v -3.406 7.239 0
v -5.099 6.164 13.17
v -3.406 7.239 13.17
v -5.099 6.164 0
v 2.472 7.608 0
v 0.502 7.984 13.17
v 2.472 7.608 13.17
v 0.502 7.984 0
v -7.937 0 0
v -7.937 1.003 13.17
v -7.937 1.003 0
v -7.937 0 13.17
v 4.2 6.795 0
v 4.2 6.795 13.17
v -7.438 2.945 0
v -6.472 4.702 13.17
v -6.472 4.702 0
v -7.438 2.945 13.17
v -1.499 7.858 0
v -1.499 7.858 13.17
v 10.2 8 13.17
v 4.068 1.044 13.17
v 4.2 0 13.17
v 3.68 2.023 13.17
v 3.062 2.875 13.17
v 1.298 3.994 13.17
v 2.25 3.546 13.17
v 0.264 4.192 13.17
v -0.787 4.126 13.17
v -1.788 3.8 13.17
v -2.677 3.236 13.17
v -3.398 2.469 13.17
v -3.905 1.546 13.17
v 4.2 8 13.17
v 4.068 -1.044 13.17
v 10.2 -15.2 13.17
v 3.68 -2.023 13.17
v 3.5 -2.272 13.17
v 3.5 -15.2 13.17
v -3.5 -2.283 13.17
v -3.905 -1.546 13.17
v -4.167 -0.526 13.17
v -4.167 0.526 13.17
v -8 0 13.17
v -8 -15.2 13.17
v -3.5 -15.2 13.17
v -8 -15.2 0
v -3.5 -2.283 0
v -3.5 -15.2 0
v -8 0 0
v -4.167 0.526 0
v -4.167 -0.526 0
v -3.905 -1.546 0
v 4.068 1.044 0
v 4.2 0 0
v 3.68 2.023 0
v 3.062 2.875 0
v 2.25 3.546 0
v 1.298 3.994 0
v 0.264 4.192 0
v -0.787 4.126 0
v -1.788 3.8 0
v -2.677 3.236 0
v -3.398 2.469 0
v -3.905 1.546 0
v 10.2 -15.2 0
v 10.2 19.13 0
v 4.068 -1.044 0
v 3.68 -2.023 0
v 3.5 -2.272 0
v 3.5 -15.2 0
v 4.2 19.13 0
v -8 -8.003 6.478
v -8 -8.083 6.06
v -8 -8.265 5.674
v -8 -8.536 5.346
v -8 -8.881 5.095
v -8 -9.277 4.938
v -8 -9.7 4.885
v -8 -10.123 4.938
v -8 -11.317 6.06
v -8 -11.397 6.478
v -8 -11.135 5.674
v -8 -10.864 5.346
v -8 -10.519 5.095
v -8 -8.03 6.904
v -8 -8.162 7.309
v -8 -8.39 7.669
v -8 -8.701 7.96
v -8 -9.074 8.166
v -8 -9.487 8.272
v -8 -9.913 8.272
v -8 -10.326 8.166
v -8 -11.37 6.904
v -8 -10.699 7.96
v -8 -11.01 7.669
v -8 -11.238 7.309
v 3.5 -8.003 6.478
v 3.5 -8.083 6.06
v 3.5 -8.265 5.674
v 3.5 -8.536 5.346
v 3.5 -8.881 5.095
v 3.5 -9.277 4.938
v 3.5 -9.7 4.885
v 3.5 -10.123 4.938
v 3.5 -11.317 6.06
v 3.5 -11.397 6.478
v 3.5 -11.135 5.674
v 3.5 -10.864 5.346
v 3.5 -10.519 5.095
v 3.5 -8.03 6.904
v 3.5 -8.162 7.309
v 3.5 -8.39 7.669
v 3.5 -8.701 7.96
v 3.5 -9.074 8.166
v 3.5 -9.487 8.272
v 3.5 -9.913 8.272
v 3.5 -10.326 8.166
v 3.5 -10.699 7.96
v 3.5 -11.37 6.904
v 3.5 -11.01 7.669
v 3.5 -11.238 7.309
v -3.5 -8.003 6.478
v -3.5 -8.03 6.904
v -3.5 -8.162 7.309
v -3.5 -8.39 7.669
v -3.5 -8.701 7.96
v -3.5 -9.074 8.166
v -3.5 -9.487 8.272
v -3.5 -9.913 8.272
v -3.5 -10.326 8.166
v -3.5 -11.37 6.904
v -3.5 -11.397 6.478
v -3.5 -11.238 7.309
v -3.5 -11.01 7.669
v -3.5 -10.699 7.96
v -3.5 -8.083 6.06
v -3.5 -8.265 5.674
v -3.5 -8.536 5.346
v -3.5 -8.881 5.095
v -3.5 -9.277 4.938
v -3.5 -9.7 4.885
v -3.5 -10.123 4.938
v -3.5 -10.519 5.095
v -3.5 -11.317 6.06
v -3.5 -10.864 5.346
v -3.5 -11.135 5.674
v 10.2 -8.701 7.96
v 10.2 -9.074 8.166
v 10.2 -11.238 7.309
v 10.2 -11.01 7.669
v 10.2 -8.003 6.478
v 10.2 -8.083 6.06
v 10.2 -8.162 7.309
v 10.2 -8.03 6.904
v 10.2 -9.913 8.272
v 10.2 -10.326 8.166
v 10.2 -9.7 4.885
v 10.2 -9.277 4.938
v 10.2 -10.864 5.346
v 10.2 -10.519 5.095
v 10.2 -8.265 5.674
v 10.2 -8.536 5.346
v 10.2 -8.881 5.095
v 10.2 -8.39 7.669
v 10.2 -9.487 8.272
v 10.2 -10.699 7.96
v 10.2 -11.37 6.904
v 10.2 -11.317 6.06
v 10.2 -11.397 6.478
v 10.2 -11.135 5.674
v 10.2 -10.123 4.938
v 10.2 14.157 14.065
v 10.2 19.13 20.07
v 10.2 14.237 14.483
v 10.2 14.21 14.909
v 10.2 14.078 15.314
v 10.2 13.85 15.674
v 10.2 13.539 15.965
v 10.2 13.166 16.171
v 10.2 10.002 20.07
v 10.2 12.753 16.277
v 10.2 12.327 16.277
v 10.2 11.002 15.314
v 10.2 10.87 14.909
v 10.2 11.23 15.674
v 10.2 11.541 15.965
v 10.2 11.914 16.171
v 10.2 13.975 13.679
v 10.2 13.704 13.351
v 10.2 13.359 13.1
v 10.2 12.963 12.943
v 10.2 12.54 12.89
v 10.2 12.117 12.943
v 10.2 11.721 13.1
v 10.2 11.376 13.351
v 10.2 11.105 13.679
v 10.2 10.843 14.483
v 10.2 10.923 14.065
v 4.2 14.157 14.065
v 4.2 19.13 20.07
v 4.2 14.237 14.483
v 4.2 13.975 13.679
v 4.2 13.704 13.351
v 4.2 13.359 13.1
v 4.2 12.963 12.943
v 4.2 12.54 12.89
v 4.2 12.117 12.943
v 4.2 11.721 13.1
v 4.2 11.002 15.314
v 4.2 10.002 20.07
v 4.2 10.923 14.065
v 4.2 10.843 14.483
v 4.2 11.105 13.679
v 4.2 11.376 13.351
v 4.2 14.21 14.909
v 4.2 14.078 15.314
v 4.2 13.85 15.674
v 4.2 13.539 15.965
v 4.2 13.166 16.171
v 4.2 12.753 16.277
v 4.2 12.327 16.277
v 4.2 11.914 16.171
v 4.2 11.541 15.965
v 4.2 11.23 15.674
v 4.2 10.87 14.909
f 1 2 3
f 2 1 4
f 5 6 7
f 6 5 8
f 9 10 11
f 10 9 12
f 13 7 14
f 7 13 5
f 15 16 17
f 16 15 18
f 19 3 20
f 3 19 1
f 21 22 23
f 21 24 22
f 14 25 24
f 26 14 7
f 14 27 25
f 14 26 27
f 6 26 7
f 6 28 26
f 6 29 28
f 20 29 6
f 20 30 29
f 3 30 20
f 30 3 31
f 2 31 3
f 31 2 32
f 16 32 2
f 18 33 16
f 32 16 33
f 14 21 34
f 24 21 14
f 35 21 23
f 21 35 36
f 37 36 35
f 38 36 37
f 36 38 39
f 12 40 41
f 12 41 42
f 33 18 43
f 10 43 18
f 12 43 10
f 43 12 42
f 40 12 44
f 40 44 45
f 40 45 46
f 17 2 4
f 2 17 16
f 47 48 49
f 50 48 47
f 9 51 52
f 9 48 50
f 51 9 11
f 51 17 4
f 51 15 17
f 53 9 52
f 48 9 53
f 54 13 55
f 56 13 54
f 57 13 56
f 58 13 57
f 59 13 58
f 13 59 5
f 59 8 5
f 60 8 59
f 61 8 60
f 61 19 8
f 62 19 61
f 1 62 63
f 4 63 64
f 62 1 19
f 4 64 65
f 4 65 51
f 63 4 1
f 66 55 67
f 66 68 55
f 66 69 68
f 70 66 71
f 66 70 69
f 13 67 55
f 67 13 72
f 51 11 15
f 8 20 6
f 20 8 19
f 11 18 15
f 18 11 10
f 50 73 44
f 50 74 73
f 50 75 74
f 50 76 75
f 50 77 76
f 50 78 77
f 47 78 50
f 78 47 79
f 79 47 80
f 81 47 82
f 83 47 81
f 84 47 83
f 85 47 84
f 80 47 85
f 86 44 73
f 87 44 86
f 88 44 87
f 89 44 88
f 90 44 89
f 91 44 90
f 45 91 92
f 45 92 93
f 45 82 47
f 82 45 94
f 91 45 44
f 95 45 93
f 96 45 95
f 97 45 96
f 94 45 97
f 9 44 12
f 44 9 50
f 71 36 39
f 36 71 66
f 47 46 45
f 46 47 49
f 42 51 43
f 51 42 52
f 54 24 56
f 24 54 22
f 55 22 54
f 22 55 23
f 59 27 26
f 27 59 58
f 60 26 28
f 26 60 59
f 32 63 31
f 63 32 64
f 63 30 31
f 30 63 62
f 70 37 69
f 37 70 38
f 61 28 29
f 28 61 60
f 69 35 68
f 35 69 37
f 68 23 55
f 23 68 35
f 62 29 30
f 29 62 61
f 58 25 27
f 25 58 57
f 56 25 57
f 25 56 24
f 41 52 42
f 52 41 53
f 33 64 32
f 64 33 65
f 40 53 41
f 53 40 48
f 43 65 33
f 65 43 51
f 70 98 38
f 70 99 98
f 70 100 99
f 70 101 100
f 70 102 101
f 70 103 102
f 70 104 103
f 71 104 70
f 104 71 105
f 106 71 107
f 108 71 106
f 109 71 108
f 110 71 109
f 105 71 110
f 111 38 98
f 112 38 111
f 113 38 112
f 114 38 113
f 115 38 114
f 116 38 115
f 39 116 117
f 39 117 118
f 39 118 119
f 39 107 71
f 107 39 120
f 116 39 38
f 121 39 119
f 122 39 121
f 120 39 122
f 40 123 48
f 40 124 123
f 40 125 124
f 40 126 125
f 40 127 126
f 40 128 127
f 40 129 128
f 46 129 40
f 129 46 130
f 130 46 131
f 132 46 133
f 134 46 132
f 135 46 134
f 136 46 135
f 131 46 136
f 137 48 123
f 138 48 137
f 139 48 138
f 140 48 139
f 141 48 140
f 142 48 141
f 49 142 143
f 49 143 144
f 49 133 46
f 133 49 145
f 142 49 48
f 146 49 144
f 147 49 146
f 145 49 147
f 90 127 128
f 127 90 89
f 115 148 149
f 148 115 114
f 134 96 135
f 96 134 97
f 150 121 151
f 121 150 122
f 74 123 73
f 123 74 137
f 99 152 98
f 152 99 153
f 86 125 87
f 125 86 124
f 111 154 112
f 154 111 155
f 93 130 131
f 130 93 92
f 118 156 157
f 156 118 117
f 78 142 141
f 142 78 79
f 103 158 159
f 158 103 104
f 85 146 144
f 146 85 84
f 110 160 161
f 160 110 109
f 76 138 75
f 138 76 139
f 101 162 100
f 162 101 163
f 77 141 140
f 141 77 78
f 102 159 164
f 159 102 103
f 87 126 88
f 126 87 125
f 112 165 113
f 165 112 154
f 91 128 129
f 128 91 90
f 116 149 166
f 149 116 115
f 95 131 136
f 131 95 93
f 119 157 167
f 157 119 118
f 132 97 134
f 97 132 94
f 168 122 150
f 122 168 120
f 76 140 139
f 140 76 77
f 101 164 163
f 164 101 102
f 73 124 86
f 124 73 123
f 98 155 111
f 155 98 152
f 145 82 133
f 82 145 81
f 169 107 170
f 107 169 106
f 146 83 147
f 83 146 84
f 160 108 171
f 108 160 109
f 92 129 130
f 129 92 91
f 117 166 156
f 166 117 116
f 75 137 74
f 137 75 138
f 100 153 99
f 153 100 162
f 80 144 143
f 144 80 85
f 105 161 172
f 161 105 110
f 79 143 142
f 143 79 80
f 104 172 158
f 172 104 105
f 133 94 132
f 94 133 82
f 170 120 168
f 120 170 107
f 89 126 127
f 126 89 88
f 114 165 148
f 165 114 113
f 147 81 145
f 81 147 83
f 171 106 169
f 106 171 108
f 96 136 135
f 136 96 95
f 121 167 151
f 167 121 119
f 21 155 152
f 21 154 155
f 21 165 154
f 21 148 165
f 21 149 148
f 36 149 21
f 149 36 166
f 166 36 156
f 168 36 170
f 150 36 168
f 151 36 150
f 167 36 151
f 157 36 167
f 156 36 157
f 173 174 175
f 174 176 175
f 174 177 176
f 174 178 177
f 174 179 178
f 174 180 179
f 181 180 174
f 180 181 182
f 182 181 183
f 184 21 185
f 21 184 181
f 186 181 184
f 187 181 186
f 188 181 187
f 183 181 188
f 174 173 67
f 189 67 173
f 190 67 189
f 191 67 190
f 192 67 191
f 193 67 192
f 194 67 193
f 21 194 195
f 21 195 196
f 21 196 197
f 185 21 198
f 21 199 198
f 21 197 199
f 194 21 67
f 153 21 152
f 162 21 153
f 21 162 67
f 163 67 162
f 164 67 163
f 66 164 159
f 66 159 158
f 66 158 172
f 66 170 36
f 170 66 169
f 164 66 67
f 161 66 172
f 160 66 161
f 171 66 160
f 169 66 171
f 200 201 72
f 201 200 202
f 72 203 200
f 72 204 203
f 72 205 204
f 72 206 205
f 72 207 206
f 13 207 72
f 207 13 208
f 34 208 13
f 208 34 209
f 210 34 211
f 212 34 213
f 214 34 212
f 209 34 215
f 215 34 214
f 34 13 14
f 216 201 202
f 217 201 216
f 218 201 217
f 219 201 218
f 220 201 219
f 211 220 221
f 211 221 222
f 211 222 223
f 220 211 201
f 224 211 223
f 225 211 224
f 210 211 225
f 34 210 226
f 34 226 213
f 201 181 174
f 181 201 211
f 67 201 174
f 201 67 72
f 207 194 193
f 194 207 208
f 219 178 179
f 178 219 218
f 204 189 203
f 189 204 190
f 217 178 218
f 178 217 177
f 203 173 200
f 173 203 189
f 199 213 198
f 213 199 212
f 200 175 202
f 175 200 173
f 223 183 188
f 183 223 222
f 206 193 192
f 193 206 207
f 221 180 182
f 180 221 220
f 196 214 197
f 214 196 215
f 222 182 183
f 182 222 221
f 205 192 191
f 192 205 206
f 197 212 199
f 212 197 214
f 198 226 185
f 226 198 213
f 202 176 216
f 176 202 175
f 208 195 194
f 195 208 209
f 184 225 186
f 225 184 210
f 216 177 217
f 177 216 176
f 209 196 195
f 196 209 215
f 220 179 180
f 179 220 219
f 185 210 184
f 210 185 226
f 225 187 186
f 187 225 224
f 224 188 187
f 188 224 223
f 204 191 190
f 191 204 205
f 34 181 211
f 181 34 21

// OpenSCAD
// file: library/component-data.scad
// ========================================================================================
// Robori Mendel
// Dimensions of standard components
// GNU GPL v3
//
// Contact : support@robori.com
// Reference : http://www.robori.com/documentation/Mendel
//
// History :
// 31 Jan 2015 - First version
// ========================================================================================

// Linear bearing LM8UU
LM8UU_L = 24;
LM8UU_OD = 15;
LM8UU_ID = 8;

// Pulley GT2
PULLEY_GT2_ID = 5;
PULLEY_GT2_OD = 18;
PULLEY_GT2_L = 18.5;
PULLEY_GT2_FLANGE_L = 1.5;
PULLEY_GT2_TEETH_L = 7.5;
PULLEY_GT2_TEETH_OD = 10;
PULLEY_GT2_HUB_L =  PULLEY_GT2_L - PULLEY_GT2_FLANGE_L - PULLEY_GT2_TEETH_L;		// = 9.5

// Nylock nut
NYLOCK_NUT_M5_H = 5;

// NEMA 17
NEMA17_L = 42;
NEMA17_SCREW_FROM_EDGE = (42 - 31)/2;
NEMA17_SCREW_SIZE = 3;

// Fan 40mm x 40mm
FAN40_L = 40;
FAN40_ID = 38;
FAN40_SCREW_D = 3.4;
FAN40_SCREW_FROM_EDGE = 4;

// Washer
WASHER_M3_ID = 3.2;
WASHER_M3_OD = 6;
WASHER_M3_H = 0.5;
// file: library/component.scad
// ========================================================================================
// Robori Mendel
// RP library
// GNU GPL v3
//
// Contact : support@robori.com
// Reference : http://www.robori.com/documentation/Mendel
//
// History :
// 31 Jan 2015 - First version
// ========================================================================================

include <component-data.scad>

component_fn = 25;

// Rod clamp
module clamp(in_dia, out_dia, leg_length, leg_space, height, screw_dia, screw_dist_from_end)
{
	difference()
	{
		union()
		{
			cylinder(h=height, r=out_dia/2, center=false, $fn=component_fn);
			translate([-out_dia/2, -in_dia/2 - leg_length, 0]) cube([out_dia, in_dia/2 + leg_length, height]);
		}
		// hole
		translate([0, 0, -1]) cylinder(h=height + 2, r=in_dia/2, center=false, $fn=component_fn);
		// leg space
		translate([-leg_space/2, -in_dia/2 - leg_length - 1, -1]) cube([leg_space, in_dia/2 + leg_length + 1, height + 2]);
		// screw hole
		translate([-out_dia/2 - 1, -in_dia/2 - leg_length + screw_dist_from_end, height/2]) rotate([0, 90, 0]) cylinder(h=out_dia + 2, r=screw_dia/2, center=false, $fn=component_fn);
	}
}

// LM8UU holder
lm8uu_holder_wall_t = 3;
lm8uu_holder_cone_l = 2;
lm8uu_holder_slot_w = 9;
lm8uu_holder_id = LM8UU_OD - 0.1;
lm8uu_holder_l = LM8UU_L + lm8uu_holder_cone_l;
lm8uu_holder_w = LM8UU_OD + 2*lm8uu_holder_wall_t;
lm8uu_holder_h = LM8UU_OD + 2*lm8uu_holder_cone_l;

module lm8uu_holder()
{
	cone_d1 = 0;
	cone_d2 = LM8UU_OD + 2*lm8uu_holder_cone_l;
	cone_h = cone_d2/2;

	difference()
	{
		// Block
		cube([lm8uu_holder_l, lm8uu_holder_w, lm8uu_holder_h]);
		// Cylinder
		translate([-1, lm8uu_holder_w/2, lm8uu_holder_cone_l + LM8UU_OD/2]) rotate([0, 90, 0]) cylinder(r=lm8uu_holder_id/2, h=lm8uu_holder_l + 2, center=false, $fn=component_fn);
		// Cone
		translate([lm8uu_holder_l - cone_h + 0.01, lm8uu_holder_w/2, lm8uu_holder_cone_l + LM8UU_OD/2]) rotate([0, 90, 0]) cylinder(r1=cone_d1/2, r2=cone_d2/2, h=cone_h, center=false, $fn=component_fn);
		// Slot
		translate([-1, lm8uu_holder_w/2 - lm8uu_holder_slot_w/2, lm8uu_holder_h - lm8uu_holder_cone_l*2 - 1]) cube([lm8uu_holder_l + 2, lm8uu_holder_slot_w, lm8uu_holder_cone_l*2 + 2]);
	}
}
// main file
// ========================================================================================
// Robori Mendel
// Corner clamp for RAMPS stack
// GNU GPL v3
//
// Contact : support@robori.com
// Reference : http://www.robori.com/documentation/Mendel
//
// History :
// 12 Apr 2015 - First version
// ========================================================================================

include <library/component.scad>

$fn = 25;

pcb_clamp_corner();

module pcb_clamp_corner()
{
	in_dia = 8 + 0.4;	// 2015-05-17 : increase dia by 0.4mm
	out_dia = 16;
	leg_length = 11;
	leg_space = 7;
	height = 13.17;
	screw_dia = 3 + 0.4;
	screw_dist_from_end = 5.5;

	plate_h = 6;

	difference()
	{
		union()
		{
			// clamp
			clamp(in_dia, out_dia, leg_length, leg_space, height, screw_dia, screw_dist_from_end);
			// plate
			translate([in_dia/2, -in_dia/2 - leg_length, 0]) cube([plate_h, 34.13, height]);
			translate([in_dia/2, 8, 0]) cube([plate_h, 11.13, 20.07]);
		}
		// clamp screw hole
		translate([0, -in_dia/2 - leg_length + screw_dist_from_end, height/2]) rotate([0, 90, 0]) cylinder(r=screw_dia/2, h=out_dia + plate_h, center=false);
		// pcb screw hole
		translate([in_dia/2 - 1, 12.54, 14.59]) rotate([0, 90, 0]) cylinder(r=screw_dia/2, h=plate_h + 2, center=false);
		// plate cut
		translate([in_dia/2 - 1, 8, height]) rotate([73.82, 0, 0]) cube([plate_h + 2, 8, 8]);
	}
}
